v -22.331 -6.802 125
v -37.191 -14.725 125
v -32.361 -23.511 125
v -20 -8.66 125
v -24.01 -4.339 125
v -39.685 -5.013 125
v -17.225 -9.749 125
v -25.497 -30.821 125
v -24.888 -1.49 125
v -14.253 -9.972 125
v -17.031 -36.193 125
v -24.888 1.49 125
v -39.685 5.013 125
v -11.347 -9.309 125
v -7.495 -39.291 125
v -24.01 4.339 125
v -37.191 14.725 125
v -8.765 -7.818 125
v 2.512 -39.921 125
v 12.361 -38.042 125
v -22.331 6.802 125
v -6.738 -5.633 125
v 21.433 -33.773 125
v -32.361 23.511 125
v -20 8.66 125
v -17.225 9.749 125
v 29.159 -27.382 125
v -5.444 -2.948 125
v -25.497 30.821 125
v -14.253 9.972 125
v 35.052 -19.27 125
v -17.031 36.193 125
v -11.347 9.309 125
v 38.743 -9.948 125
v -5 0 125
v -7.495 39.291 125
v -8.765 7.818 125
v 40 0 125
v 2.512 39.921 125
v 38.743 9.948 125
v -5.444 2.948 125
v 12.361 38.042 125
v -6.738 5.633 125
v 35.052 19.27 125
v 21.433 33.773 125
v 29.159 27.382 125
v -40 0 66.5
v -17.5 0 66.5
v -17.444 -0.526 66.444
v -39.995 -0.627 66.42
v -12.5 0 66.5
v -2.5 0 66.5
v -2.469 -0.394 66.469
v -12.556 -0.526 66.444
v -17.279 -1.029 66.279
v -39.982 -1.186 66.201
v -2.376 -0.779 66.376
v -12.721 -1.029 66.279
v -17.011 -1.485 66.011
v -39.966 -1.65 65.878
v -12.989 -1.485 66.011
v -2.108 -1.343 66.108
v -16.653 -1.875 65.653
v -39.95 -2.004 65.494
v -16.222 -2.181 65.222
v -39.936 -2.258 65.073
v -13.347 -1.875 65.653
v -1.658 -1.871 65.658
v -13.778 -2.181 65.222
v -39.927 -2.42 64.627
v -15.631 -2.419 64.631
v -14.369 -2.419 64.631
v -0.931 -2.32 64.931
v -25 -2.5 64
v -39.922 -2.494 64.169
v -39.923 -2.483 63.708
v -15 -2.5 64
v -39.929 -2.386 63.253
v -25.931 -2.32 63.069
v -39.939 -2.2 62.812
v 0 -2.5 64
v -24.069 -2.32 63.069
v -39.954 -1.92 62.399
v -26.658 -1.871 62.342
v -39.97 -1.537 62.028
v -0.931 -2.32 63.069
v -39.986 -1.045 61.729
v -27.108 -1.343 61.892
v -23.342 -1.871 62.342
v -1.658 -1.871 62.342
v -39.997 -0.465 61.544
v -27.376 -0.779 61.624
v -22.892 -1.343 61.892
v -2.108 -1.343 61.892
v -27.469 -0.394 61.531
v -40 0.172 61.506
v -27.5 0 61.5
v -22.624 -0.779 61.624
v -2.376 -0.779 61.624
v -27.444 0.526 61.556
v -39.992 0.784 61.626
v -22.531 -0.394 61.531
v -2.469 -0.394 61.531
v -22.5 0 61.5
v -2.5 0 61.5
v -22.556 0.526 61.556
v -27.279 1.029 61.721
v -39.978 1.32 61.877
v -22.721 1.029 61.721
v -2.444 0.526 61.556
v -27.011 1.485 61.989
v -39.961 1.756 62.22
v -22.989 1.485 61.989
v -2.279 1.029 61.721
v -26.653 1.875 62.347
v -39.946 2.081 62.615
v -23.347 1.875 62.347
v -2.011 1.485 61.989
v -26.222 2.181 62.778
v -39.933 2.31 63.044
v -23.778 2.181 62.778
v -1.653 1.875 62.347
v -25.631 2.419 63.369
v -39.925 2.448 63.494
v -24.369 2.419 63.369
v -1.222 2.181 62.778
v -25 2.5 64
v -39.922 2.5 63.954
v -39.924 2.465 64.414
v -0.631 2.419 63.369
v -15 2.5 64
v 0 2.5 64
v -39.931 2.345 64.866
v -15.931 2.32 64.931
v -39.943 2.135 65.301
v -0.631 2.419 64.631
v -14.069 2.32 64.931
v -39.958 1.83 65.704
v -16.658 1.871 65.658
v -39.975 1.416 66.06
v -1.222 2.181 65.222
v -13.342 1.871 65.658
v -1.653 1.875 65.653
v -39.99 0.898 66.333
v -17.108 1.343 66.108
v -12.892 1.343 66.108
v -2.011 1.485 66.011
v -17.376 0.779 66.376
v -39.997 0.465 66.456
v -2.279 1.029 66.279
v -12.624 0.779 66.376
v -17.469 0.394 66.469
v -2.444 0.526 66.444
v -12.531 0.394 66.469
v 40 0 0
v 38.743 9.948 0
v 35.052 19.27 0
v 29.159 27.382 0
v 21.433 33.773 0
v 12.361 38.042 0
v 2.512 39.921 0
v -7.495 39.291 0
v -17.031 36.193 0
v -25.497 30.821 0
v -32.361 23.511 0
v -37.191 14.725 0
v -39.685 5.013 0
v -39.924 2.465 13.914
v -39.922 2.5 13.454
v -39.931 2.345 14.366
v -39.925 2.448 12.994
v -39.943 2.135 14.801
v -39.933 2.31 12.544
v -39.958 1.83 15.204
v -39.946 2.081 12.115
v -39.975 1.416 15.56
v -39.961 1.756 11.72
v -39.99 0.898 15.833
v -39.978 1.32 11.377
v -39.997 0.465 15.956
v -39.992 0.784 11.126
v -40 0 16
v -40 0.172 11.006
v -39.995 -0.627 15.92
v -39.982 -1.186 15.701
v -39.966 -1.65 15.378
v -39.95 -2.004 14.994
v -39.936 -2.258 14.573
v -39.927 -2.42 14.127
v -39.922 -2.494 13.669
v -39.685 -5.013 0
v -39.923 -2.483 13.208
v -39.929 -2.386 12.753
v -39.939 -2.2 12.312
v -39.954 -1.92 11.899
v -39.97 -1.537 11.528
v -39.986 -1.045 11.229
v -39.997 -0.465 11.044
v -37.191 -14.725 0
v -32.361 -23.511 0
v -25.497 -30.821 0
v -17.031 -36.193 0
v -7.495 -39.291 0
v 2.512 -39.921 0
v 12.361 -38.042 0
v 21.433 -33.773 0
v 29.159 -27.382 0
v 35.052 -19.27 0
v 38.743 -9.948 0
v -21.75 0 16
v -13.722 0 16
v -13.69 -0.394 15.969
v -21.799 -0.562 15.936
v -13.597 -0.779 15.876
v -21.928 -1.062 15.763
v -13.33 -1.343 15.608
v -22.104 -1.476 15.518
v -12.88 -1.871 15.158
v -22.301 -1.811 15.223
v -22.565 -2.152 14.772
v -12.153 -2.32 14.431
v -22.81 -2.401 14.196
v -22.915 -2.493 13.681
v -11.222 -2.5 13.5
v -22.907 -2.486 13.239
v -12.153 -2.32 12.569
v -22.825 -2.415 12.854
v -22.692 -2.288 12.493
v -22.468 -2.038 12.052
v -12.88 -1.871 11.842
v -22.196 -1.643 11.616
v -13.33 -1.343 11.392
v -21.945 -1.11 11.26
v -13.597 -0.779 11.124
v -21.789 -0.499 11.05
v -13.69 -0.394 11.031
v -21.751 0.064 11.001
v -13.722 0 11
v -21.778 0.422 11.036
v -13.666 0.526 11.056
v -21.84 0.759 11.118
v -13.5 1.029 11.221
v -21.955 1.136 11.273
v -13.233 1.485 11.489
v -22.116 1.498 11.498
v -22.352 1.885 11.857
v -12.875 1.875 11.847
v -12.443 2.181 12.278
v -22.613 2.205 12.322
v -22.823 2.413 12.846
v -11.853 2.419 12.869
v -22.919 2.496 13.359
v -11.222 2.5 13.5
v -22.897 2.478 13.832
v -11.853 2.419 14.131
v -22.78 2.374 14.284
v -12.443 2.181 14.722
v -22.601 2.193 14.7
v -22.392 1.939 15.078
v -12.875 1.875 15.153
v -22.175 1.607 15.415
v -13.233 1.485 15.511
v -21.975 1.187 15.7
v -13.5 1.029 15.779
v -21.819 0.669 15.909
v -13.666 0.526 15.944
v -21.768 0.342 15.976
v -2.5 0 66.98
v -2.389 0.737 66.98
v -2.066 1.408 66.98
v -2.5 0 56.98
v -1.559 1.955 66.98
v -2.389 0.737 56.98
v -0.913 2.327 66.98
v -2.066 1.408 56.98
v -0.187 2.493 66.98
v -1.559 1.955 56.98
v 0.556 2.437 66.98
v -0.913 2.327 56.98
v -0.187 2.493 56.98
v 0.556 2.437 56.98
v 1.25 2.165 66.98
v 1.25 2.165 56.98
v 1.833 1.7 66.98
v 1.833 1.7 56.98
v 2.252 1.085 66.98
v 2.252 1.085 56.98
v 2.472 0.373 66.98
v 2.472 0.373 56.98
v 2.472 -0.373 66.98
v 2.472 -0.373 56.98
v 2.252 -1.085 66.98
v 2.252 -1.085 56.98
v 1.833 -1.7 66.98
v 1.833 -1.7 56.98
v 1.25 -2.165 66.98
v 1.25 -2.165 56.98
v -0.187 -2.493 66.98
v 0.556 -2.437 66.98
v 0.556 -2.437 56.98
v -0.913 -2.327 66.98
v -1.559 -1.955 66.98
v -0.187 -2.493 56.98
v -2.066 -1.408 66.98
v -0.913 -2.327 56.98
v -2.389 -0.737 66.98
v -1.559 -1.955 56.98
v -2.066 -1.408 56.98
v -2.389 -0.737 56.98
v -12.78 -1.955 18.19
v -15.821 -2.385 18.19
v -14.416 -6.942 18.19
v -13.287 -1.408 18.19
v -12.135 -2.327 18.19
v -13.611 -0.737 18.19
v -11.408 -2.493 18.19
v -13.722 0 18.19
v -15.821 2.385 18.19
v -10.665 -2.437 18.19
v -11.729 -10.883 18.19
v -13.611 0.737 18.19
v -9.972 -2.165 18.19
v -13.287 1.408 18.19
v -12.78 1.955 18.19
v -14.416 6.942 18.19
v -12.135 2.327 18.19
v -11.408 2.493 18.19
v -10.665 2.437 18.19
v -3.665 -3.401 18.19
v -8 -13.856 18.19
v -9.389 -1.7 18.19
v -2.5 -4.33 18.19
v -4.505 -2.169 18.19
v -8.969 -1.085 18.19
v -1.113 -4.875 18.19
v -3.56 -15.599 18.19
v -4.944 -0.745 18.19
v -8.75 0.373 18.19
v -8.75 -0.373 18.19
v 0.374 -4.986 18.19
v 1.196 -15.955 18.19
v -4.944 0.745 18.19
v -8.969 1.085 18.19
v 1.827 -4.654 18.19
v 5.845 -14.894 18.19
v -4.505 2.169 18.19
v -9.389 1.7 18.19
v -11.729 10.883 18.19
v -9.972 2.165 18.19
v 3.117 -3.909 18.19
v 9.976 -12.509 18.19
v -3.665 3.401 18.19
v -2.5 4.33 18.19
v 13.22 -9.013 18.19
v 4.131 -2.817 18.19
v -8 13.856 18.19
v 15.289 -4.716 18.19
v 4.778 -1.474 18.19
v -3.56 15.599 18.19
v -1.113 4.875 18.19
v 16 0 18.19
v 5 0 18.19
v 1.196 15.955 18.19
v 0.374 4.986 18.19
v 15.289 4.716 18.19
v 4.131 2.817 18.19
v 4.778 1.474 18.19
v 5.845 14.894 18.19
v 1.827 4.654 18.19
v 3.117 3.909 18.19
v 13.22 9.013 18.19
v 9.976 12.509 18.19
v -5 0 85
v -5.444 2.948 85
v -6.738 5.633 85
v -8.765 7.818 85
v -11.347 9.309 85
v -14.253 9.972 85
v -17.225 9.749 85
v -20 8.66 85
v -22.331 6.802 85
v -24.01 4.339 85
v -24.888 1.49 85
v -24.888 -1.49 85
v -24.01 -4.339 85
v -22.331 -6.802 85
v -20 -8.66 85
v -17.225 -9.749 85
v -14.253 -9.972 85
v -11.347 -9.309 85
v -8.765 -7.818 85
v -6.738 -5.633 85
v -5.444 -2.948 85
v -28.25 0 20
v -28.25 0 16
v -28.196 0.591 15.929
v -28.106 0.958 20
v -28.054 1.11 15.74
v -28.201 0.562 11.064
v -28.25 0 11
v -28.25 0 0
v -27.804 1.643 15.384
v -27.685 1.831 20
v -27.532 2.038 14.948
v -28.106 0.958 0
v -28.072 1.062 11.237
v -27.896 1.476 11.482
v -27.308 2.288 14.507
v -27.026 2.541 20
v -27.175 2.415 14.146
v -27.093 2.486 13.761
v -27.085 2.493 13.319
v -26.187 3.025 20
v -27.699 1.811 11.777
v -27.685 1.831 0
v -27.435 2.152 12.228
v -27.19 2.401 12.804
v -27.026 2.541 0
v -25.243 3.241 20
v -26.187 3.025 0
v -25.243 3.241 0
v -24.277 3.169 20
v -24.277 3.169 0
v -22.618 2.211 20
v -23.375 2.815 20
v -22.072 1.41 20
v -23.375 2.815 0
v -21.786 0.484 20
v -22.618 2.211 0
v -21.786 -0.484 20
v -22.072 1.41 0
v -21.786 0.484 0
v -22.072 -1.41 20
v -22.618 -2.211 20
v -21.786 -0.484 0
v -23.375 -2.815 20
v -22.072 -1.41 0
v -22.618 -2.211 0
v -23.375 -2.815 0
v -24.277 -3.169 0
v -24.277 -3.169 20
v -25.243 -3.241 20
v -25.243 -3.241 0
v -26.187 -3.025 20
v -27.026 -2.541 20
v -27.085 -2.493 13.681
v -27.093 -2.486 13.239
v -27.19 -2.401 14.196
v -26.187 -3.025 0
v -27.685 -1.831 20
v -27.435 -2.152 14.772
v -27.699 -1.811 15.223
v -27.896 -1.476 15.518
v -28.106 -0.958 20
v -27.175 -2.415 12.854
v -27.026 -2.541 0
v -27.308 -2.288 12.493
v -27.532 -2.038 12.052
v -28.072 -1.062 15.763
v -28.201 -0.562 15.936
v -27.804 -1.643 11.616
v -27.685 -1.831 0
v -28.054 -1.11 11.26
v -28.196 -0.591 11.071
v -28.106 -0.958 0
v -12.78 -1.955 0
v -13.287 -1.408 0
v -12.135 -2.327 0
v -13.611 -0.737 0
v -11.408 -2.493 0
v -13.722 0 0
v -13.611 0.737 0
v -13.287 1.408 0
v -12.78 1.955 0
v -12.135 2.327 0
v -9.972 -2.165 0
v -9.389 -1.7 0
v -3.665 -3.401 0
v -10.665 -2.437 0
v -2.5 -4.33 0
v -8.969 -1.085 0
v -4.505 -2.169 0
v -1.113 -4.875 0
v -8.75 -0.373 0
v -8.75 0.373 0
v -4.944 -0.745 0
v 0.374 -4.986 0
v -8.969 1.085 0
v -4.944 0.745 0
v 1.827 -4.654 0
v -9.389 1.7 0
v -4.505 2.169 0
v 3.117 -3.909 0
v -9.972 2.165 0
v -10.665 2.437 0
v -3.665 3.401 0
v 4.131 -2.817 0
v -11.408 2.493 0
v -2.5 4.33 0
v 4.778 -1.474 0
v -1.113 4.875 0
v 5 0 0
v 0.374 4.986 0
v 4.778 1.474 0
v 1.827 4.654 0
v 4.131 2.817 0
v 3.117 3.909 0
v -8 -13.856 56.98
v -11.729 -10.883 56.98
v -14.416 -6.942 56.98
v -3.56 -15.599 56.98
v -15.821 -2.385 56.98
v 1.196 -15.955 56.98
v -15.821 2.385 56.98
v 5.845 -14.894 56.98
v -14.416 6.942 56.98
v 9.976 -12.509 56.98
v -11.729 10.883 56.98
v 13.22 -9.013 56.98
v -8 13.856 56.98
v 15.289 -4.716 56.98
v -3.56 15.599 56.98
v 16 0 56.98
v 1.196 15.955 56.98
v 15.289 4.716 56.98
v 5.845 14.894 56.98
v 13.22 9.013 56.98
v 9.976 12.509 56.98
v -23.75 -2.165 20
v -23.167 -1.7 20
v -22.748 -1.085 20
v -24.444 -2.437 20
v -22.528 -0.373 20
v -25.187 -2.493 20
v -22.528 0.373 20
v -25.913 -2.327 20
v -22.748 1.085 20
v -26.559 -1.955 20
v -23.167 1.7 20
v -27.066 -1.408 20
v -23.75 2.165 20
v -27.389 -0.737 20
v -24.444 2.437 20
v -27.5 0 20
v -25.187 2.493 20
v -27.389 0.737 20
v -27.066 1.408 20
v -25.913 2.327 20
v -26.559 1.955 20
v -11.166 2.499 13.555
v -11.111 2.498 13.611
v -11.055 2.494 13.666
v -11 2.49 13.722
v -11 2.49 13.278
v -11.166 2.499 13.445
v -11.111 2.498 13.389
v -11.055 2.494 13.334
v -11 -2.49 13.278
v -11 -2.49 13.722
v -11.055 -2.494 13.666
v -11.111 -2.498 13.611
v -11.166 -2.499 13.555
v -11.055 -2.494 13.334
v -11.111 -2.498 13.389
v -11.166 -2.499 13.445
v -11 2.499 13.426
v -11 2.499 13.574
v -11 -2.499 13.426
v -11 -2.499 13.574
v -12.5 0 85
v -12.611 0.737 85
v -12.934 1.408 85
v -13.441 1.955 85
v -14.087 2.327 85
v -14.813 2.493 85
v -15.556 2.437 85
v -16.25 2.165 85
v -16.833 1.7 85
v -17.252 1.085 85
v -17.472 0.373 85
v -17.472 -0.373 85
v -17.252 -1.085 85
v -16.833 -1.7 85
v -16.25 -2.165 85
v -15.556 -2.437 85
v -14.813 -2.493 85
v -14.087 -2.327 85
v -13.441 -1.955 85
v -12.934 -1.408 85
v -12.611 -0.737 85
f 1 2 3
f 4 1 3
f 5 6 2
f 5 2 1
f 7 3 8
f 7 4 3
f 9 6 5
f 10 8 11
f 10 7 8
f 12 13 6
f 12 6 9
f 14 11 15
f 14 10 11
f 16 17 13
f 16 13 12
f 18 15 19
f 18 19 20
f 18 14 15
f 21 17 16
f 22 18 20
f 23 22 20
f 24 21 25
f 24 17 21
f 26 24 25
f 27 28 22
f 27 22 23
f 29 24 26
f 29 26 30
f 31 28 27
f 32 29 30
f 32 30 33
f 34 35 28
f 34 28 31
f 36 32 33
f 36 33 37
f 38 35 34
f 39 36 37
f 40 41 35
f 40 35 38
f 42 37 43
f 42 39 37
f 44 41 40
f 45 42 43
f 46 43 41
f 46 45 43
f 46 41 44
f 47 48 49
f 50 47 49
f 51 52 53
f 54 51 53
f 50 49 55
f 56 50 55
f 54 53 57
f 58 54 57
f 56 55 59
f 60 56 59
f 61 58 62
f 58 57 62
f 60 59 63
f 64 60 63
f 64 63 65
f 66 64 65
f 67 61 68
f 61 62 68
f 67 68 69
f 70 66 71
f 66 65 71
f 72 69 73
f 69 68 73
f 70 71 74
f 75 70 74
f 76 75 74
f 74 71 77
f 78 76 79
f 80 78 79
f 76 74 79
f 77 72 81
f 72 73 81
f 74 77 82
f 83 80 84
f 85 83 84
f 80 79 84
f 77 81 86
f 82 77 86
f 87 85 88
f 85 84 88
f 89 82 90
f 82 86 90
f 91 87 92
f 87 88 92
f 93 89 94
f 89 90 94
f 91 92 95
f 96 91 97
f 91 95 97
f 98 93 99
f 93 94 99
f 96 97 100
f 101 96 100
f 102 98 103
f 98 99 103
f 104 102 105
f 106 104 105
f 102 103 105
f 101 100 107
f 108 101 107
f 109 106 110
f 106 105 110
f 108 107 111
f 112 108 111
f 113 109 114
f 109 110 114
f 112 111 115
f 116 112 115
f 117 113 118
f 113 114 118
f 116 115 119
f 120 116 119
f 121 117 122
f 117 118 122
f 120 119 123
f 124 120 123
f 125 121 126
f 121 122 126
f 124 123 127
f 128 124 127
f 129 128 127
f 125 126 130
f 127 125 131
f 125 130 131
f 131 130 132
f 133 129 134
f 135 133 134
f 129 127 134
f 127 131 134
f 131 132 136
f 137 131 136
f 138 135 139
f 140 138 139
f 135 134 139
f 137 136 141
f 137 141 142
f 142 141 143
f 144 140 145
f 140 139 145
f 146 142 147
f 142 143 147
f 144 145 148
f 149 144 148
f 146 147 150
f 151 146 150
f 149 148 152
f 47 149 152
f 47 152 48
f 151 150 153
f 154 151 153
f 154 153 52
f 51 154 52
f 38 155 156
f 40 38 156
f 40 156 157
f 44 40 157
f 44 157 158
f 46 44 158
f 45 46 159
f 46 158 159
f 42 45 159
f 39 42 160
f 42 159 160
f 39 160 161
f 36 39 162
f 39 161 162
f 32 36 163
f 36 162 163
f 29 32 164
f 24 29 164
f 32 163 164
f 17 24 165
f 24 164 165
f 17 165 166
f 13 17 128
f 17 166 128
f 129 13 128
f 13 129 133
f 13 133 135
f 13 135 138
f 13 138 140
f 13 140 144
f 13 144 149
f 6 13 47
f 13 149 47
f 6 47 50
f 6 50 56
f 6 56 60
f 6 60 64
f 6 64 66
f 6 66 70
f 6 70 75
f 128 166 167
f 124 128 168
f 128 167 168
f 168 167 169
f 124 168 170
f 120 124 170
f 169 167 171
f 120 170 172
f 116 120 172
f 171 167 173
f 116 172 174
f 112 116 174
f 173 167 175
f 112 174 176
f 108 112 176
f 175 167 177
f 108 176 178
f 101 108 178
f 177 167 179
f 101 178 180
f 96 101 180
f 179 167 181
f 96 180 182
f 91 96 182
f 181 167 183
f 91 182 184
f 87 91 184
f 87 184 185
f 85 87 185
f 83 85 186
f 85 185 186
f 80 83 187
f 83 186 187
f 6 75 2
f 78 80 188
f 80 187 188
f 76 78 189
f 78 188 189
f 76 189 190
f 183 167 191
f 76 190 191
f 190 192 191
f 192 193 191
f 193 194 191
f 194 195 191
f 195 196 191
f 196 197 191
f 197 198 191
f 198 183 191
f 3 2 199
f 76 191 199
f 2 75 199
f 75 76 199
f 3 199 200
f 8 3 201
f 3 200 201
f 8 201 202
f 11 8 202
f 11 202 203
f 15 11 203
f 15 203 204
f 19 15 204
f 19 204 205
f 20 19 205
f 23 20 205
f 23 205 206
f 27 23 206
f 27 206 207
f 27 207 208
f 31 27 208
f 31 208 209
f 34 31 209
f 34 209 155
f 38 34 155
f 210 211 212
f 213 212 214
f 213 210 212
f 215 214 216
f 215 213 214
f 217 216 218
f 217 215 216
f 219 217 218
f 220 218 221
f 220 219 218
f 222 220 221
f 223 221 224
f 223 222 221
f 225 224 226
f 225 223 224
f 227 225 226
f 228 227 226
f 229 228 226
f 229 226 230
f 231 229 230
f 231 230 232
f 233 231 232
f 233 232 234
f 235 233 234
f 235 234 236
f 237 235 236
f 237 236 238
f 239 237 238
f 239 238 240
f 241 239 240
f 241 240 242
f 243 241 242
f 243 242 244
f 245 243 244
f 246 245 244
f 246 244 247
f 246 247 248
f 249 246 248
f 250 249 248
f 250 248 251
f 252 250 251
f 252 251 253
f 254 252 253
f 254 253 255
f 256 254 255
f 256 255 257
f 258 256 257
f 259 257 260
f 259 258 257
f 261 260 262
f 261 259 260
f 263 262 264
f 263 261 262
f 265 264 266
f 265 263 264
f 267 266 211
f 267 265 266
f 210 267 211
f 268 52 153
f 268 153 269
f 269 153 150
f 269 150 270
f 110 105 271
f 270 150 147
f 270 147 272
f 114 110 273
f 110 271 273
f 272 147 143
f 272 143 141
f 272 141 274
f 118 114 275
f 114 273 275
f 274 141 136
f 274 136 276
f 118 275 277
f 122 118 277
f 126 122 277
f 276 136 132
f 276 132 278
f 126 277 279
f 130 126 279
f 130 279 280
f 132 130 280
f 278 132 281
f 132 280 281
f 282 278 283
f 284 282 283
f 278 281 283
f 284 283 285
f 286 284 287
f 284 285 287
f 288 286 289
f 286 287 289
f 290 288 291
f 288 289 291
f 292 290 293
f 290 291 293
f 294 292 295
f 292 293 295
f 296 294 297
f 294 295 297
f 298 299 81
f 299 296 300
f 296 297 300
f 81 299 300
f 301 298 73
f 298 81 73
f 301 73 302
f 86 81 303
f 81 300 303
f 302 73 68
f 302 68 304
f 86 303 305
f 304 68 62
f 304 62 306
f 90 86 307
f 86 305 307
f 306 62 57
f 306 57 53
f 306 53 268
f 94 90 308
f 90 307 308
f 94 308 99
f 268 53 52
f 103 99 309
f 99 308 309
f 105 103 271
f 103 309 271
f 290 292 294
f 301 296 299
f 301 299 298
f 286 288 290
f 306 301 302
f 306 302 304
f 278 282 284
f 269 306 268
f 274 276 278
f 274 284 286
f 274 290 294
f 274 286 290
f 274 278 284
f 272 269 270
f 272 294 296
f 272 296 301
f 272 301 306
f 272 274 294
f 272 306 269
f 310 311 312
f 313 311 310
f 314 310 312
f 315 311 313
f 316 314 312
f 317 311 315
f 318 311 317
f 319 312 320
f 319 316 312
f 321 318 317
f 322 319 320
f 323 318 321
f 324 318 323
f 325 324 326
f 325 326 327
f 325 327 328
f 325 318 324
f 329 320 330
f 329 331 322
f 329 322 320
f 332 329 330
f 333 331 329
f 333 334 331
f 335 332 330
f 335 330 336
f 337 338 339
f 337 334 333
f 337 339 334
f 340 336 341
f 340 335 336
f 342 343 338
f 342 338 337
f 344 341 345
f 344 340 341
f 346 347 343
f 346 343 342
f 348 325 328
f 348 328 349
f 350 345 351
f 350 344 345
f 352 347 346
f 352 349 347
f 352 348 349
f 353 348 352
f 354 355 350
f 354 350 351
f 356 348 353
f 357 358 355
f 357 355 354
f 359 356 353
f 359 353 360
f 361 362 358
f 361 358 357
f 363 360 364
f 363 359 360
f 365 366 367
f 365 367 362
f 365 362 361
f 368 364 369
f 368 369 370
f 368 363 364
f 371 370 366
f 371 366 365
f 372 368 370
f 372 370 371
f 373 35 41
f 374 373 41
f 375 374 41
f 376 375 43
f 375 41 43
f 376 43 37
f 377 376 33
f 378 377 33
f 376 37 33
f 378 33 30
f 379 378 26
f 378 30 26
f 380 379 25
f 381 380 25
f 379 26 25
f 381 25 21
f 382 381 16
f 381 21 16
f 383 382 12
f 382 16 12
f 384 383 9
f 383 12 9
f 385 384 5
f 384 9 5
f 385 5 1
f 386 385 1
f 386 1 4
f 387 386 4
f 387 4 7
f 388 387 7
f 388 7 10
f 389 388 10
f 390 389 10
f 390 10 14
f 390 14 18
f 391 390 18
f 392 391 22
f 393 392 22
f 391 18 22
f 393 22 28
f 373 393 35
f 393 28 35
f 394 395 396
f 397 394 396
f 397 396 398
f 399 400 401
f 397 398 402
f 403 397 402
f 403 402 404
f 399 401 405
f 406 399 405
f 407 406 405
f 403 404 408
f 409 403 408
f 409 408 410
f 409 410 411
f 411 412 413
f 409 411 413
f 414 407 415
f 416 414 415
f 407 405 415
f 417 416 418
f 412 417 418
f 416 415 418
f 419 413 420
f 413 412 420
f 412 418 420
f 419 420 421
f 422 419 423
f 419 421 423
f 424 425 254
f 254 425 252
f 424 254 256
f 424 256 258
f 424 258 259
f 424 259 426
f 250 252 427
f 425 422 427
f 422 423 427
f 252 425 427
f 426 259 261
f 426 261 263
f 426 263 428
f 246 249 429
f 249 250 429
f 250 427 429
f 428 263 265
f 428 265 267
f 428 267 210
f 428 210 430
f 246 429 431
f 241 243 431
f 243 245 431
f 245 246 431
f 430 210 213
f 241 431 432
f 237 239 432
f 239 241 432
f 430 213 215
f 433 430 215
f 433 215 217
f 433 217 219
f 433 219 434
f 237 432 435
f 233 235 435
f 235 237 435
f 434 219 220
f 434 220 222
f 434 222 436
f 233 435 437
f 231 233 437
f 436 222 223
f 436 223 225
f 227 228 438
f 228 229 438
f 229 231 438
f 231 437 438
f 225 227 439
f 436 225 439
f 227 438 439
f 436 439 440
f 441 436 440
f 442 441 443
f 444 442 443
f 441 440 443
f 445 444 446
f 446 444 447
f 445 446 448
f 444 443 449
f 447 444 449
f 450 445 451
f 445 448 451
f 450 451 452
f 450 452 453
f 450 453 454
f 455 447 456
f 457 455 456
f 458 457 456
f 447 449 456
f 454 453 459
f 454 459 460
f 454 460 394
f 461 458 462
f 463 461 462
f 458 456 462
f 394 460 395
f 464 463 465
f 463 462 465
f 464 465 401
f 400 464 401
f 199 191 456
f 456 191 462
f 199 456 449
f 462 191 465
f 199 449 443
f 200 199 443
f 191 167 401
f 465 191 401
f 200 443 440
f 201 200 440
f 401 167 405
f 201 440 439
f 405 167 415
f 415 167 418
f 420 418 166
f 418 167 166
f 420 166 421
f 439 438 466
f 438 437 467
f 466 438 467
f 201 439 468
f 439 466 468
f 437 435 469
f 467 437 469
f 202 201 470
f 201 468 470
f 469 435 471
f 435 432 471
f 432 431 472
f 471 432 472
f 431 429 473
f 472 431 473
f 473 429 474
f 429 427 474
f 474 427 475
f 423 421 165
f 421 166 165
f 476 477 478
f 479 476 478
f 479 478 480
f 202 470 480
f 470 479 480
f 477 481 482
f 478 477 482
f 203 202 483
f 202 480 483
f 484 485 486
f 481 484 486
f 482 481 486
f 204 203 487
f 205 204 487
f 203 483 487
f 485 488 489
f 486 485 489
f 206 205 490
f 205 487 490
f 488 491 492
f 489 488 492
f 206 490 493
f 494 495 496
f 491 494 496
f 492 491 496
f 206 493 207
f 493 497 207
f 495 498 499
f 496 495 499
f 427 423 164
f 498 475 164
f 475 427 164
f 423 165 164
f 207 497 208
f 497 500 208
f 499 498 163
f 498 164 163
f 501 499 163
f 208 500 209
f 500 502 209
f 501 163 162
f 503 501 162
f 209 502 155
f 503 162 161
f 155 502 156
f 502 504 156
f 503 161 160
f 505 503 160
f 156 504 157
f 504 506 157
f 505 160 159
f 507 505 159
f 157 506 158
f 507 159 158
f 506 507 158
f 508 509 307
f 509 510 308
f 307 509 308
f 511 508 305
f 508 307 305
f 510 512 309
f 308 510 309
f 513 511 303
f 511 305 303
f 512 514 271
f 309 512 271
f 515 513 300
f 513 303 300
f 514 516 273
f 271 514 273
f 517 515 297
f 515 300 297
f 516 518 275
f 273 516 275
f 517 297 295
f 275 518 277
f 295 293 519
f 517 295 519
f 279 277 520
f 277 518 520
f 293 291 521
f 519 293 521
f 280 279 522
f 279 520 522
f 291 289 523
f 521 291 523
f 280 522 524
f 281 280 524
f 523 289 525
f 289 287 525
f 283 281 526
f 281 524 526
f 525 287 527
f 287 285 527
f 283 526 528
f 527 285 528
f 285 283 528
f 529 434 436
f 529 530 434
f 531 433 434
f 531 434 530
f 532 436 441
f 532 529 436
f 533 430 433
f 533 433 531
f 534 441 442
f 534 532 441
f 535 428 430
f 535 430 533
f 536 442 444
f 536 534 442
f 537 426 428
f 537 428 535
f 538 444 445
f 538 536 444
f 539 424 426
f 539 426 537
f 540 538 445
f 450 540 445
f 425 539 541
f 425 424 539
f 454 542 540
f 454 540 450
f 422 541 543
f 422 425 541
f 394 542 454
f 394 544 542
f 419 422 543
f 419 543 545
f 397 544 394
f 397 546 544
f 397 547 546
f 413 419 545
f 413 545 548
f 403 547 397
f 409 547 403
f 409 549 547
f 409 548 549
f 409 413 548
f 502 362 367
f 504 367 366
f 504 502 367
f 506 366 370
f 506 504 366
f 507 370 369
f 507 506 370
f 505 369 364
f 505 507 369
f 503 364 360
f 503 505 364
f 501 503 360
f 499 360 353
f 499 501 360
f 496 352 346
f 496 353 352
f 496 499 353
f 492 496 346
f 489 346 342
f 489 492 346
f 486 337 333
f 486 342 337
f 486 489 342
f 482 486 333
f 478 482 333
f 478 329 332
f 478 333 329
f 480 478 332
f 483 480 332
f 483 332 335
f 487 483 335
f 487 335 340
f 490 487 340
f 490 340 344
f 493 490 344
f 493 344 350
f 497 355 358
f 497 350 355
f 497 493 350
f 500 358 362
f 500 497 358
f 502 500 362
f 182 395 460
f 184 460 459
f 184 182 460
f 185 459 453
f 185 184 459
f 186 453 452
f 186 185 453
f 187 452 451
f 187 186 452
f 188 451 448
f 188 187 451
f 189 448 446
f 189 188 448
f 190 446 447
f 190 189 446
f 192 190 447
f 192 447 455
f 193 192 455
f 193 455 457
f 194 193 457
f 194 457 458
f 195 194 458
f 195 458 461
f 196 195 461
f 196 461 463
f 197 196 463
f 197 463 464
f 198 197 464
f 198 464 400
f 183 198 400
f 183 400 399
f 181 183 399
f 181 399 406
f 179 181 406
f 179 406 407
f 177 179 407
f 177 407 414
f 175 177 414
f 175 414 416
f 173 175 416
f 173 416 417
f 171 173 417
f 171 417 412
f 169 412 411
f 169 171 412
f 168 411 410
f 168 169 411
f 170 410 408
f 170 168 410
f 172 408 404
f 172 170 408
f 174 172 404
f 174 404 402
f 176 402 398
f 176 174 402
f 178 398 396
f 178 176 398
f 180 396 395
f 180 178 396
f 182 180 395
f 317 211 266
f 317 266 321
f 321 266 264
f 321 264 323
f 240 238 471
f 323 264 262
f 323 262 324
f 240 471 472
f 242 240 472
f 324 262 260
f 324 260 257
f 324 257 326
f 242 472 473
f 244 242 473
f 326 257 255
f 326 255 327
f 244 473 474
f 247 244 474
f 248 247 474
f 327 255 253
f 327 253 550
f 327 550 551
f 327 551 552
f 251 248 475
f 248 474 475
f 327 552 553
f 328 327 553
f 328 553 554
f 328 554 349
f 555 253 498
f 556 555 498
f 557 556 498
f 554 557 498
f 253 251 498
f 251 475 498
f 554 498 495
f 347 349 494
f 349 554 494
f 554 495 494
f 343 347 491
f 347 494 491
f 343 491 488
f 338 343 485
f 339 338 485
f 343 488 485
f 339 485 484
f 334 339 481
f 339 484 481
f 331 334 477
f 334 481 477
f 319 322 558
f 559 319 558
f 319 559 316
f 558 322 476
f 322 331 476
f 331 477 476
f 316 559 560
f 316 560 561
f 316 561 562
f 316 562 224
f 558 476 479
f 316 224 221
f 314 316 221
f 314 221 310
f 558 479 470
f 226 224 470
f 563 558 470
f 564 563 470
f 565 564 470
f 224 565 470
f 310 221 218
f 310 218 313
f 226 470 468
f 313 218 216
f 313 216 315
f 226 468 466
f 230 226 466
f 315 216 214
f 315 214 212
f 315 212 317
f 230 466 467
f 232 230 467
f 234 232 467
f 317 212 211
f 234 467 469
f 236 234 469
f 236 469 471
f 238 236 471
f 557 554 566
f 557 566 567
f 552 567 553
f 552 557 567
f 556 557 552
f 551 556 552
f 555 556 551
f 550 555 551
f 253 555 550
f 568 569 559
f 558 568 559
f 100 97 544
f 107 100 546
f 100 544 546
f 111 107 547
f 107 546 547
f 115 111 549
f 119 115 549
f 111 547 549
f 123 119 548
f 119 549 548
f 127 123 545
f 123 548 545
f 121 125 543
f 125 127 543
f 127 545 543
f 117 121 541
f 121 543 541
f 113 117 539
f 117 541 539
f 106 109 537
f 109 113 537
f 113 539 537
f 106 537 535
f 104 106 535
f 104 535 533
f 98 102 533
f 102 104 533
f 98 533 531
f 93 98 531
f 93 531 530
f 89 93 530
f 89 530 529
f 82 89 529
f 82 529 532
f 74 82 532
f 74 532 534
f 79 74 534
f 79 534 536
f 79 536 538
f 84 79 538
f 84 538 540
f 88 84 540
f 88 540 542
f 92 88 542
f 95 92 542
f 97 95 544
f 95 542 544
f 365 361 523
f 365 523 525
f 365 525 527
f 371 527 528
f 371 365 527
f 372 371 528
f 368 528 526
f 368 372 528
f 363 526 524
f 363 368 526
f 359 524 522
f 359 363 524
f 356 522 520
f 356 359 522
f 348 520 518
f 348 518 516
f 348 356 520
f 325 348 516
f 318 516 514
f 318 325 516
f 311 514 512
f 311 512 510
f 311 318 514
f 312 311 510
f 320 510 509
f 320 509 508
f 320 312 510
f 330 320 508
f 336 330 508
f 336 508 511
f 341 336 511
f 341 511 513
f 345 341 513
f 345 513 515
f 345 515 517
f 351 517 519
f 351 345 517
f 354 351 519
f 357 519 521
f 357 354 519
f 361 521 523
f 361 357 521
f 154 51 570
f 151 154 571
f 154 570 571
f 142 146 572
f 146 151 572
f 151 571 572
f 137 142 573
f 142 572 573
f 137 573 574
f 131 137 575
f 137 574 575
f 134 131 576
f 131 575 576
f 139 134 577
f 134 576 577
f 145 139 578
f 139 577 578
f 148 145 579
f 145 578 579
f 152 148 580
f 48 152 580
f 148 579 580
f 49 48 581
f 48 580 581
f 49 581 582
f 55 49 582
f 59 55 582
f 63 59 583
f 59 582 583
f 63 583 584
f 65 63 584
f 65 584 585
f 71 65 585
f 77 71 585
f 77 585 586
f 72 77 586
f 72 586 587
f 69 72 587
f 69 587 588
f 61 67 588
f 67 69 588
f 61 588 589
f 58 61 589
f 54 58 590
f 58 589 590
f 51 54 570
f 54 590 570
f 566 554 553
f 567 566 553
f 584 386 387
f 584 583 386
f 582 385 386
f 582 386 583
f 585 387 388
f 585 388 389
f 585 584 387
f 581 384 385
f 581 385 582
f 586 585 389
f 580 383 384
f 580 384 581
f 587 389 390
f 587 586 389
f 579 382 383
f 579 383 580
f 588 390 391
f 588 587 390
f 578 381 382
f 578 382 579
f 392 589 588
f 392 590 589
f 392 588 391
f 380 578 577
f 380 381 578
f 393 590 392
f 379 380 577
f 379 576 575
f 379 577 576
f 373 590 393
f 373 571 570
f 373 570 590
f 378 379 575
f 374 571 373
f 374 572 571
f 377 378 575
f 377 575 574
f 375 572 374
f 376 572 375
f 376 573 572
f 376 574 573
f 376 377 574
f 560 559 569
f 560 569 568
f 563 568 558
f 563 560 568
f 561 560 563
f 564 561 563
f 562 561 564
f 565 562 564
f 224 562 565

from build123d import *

# Parameters (mm, degrees)
SKETCH1_R           = 40
BOSS_EXTRUDE1_DEPTH = 125
SKETCH9_R           = 16
CUT_EXTRUDE3_DEPTH  = 38.79
SKETCH11_R          = 2.5
CUT_EXTRUDE5_DEPTH  = 10
SKETCH10_R          = 5
CUT_EXTRUDE4_DEPTH  = 38.5
SKETCH12_R          = 2.5
CUT_EXTRUDE7_DEPTH  = 44
SKETCH13_R          = 2.5
CUT_EXTRUDE8_DEPTH  = 64
SKETCH14_R          = 3.25
CUT_EXTRUDE9_DEPTH  = 20
SKETCH16_R          = 2.5
CUT_EXTRUDE10_DEPTH = 36
SKETCH18_R          = 2.5
CUT_EXTRUDE11_DEPTH = 29
SKETCH21_R          = 10
CUT_EXTRUDE12_DEPTH = 40
SKETCH22_R          = 2.5
CUT_EXTRUDE13_DEPTH = 21


with BuildPart() as part:
    # Sketch1 → Boss-Extrude1 (new body)
    with BuildSketch(Plane.XY):
        Circle(SKETCH1_R)
    extrude(amount=BOSS_EXTRUDE1_DEPTH)

    # Sketch9 → Cut-Extrude3 (cut)
    with BuildSketch(Plane.XY.offset(18.19)):
        Circle(SKETCH9_R)
    extrude(amount=CUT_EXTRUDE3_DEPTH, mode=Mode.SUBTRACT)

    # Sketch11 → Cut-Extrude5 (cut)
    with BuildSketch(Plane(origin=(0, 0, 56.98), x_dir=(-1, 0, 0), z_dir=(0, 0, -1))):
        Circle(SKETCH11_R)
    extrude(amount=-CUT_EXTRUDE5_DEPTH, mode=Mode.SUBTRACT)

    # Sketch10 → Cut-Extrude4 (cut)
    with BuildSketch(Plane.XY):
        Circle(SKETCH10_R)
    extrude(amount=CUT_EXTRUDE4_DEPTH, mode=Mode.SUBTRACT)

    # Sketch12 → Cut-Extrude7 (cut)
    with BuildSketch(Plane(origin=(0, 0, 0), x_dir=(0, 0, -1), z_dir=(1, 0, 0))):
        with Locations(Location((-64, 0, 0), (0, 0, 180))):
            Circle(SKETCH12_R)
    extrude(amount=-CUT_EXTRUDE7_DEPTH, mode=Mode.SUBTRACT)

    # Sketch13 → Cut-Extrude8 (cut)
    with BuildSketch(Plane(origin=(0, 0, 0), x_dir=(-1, 0, 0), z_dir=(0, 0, -1))):
        with Locations((25, 0)):
            Circle(SKETCH13_R)
    extrude(amount=-CUT_EXTRUDE8_DEPTH, mode=Mode.SUBTRACT)

    # Sketch14 → Cut-Extrude9 (cut)
    with BuildSketch(Plane(origin=(0, 0, 0), x_dir=(-1, 0, 0), z_dir=(0, 0, -1))):
        with Locations((25, 0)):
            Circle(SKETCH14_R)
    extrude(amount=-CUT_EXTRUDE9_DEPTH, mode=Mode.SUBTRACT)

    # Sketch16 → Cut-Extrude10 (cut)
    with BuildSketch(Plane(origin=(0, 0, 0), x_dir=(-1, 0, 0), z_dir=(0, 0, -1))):
        with Locations((11.221670406, 0)):
            Circle(SKETCH16_R)
    extrude(amount=-CUT_EXTRUDE10_DEPTH, mode=Mode.SUBTRACT)

    # Sketch18 → Cut-Extrude11 (cut)
    with BuildSketch(Plane(origin=(-40, 0, 0), x_dir=(0, 0, -1), z_dir=(1, 0, 0))):
        with Locations(Location((-13.5, 0, 0), (0, 0, 180))):
            Circle(SKETCH18_R)
    extrude(amount=CUT_EXTRUDE11_DEPTH, mode=Mode.SUBTRACT)

    # Sketch21 → Cut-Extrude12 (cut)
    with BuildSketch(Plane.XY.offset(125)):
        with Locations((-15, 0)):
            Circle(SKETCH21_R)
    extrude(amount=-CUT_EXTRUDE12_DEPTH, mode=Mode.SUBTRACT)

    # Sketch22 → Cut-Extrude13 (cut)
    with BuildSketch(Plane.XY.offset(85)):
        with Locations((-15, 0)):
            Circle(SKETCH22_R)
    extrude(amount=-CUT_EXTRUDE13_DEPTH, mode=Mode.SUBTRACT)


solid = part.part
